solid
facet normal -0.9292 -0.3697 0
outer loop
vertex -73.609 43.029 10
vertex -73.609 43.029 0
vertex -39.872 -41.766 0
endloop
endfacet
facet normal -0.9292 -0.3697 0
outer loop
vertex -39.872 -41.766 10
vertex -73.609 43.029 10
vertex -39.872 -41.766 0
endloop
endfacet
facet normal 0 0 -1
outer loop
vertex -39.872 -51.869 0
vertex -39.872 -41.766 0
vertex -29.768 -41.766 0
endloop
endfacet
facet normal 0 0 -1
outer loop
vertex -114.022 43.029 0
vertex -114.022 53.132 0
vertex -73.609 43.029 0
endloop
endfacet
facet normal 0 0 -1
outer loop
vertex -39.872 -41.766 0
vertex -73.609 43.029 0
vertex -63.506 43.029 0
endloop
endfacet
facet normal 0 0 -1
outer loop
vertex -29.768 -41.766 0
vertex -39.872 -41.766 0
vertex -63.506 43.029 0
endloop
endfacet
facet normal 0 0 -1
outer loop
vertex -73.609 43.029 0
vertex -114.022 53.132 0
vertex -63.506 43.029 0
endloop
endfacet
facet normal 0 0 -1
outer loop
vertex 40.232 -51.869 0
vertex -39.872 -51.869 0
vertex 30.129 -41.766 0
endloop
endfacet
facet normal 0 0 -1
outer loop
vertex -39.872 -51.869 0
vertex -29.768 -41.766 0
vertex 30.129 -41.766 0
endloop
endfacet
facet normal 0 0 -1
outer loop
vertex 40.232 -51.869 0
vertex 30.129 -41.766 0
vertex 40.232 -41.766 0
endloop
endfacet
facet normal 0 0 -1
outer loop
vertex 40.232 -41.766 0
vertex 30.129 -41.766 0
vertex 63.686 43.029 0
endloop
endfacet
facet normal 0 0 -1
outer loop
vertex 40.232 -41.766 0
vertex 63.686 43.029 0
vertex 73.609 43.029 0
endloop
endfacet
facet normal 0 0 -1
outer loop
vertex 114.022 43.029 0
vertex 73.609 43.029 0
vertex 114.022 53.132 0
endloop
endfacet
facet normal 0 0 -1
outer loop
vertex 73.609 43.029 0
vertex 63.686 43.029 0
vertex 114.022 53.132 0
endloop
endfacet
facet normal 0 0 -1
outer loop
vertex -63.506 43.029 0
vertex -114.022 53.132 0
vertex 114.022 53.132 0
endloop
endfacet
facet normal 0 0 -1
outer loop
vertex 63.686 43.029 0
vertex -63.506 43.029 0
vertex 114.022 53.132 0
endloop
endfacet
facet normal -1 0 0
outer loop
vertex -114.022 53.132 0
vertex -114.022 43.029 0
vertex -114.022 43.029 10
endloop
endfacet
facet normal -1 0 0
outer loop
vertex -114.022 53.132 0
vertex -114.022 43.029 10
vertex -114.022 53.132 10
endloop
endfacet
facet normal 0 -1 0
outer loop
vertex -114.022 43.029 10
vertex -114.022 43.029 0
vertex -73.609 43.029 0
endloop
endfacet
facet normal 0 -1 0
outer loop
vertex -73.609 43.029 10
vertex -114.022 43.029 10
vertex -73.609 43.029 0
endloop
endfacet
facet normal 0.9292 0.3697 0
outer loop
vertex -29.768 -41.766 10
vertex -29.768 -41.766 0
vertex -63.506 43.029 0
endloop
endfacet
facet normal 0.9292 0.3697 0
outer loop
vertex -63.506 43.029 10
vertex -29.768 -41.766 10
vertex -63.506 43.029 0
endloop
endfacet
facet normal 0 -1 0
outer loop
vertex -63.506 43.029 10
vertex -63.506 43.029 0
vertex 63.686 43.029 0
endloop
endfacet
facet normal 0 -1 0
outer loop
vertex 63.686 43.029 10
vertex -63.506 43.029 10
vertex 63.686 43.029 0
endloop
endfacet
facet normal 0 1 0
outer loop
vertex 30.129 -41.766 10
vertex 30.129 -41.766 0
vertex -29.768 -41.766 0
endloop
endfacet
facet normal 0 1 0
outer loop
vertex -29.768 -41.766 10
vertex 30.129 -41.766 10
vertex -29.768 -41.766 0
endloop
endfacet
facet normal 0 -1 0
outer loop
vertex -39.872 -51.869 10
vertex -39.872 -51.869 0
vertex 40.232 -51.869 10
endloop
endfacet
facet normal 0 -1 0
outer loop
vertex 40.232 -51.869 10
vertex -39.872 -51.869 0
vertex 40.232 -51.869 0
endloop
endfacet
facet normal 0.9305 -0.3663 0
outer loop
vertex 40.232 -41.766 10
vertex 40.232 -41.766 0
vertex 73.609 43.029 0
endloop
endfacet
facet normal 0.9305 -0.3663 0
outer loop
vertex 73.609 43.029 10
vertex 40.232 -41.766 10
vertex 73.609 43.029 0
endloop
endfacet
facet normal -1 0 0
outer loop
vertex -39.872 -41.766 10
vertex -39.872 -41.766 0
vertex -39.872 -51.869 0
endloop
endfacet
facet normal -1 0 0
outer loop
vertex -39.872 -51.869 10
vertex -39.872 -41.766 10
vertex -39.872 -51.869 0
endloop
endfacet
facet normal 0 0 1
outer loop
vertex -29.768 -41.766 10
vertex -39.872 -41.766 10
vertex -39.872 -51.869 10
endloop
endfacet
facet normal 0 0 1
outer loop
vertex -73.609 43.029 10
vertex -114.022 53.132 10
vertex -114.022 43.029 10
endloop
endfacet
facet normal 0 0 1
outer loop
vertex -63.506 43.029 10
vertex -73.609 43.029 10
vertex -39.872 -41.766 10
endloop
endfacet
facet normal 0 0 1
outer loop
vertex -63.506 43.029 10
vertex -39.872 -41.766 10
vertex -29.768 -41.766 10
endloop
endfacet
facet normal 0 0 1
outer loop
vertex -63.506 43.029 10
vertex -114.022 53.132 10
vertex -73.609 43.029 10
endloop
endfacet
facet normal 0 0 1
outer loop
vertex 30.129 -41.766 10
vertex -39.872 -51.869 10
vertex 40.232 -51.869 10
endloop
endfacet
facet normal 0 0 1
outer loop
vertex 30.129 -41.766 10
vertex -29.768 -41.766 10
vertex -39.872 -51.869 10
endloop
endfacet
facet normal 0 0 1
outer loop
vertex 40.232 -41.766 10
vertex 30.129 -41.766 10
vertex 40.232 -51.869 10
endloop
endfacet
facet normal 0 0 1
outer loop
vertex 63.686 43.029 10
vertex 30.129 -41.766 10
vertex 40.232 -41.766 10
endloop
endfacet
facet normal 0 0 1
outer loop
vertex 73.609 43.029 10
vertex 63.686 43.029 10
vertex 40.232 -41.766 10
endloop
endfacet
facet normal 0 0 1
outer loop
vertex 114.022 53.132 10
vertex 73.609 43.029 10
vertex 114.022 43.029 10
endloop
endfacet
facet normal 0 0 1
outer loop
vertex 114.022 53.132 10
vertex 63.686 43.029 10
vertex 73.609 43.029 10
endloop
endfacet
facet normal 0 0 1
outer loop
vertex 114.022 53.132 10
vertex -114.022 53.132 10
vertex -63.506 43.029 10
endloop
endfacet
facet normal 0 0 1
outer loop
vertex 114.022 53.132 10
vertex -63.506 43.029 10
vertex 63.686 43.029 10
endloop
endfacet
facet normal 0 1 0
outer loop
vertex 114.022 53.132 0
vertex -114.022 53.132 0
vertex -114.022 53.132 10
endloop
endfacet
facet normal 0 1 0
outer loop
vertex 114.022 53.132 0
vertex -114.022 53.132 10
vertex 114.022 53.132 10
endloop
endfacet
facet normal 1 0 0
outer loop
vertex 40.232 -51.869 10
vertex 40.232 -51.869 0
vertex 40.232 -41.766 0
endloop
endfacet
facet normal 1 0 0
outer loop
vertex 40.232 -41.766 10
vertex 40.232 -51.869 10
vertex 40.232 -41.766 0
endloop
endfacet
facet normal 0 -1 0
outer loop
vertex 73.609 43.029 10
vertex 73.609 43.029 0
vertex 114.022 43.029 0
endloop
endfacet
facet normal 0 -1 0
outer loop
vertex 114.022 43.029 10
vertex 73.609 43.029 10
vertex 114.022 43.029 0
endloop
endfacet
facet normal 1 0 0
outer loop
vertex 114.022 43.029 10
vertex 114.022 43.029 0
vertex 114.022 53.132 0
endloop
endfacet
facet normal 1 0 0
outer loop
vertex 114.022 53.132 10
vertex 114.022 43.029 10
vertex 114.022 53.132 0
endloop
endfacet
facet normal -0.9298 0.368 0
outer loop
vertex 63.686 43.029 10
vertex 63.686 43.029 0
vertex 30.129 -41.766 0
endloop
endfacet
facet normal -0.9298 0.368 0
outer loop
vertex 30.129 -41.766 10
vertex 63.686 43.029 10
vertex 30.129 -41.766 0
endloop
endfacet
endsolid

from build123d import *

# Parameters (mm, degrees)
SKETCH1_W      = 228.04397219
SKETCH1_H      = 10.103213958
EXTRUDE1_DEPTH = 10
EXTRUDE2_DEPTH = 10
EXTRUDE3_DEPTH = 10


with BuildPart() as part:
    # Sketch1 → Extrude1 (new body)
    with BuildSketch(Plane.XY):
        with Locations((0, 48.080473567)):
            Rectangle(SKETCH1_W, SKETCH1_H)
    extrude(amount=EXTRUDE1_DEPTH)



with BuildPart() as body_2:
    # Sketch1<3> → Extrude2 (new body)
    with BuildSketch(Plane.XY):
        Polygon((40.232441296, -51.869178801), (40.232441296, -41.765964843), (30.129227338, -41.765964843), (-29.768398268, -41.765964843), (-39.871612226, -41.765964843), (-39.871612226, -51.869178801), align=None)
    extrude(amount=EXTRUDE2_DEPTH)


with BuildPart() as part_1:
    add(part.part)

    add(body_2.part)  # Extrude3 merges body 2
    # Sketch1<4> → Extrude3 (add)
    with BuildSketch(Plane.XY):
        Polygon((40.232441296, -41.765964843), (73.609130264, 43.028866588), (63.686330841, 43.028866588), (30.129227338, -41.765964843), align=None)
        Polygon((-29.768398268, -41.765964843), (-63.505916306, 43.028866588), (-73.609130264, 43.028866588), (-39.871612226, -41.765964843), align=None)
    extrude(amount=EXTRUDE3_DEPTH)


solid = part_1.part
